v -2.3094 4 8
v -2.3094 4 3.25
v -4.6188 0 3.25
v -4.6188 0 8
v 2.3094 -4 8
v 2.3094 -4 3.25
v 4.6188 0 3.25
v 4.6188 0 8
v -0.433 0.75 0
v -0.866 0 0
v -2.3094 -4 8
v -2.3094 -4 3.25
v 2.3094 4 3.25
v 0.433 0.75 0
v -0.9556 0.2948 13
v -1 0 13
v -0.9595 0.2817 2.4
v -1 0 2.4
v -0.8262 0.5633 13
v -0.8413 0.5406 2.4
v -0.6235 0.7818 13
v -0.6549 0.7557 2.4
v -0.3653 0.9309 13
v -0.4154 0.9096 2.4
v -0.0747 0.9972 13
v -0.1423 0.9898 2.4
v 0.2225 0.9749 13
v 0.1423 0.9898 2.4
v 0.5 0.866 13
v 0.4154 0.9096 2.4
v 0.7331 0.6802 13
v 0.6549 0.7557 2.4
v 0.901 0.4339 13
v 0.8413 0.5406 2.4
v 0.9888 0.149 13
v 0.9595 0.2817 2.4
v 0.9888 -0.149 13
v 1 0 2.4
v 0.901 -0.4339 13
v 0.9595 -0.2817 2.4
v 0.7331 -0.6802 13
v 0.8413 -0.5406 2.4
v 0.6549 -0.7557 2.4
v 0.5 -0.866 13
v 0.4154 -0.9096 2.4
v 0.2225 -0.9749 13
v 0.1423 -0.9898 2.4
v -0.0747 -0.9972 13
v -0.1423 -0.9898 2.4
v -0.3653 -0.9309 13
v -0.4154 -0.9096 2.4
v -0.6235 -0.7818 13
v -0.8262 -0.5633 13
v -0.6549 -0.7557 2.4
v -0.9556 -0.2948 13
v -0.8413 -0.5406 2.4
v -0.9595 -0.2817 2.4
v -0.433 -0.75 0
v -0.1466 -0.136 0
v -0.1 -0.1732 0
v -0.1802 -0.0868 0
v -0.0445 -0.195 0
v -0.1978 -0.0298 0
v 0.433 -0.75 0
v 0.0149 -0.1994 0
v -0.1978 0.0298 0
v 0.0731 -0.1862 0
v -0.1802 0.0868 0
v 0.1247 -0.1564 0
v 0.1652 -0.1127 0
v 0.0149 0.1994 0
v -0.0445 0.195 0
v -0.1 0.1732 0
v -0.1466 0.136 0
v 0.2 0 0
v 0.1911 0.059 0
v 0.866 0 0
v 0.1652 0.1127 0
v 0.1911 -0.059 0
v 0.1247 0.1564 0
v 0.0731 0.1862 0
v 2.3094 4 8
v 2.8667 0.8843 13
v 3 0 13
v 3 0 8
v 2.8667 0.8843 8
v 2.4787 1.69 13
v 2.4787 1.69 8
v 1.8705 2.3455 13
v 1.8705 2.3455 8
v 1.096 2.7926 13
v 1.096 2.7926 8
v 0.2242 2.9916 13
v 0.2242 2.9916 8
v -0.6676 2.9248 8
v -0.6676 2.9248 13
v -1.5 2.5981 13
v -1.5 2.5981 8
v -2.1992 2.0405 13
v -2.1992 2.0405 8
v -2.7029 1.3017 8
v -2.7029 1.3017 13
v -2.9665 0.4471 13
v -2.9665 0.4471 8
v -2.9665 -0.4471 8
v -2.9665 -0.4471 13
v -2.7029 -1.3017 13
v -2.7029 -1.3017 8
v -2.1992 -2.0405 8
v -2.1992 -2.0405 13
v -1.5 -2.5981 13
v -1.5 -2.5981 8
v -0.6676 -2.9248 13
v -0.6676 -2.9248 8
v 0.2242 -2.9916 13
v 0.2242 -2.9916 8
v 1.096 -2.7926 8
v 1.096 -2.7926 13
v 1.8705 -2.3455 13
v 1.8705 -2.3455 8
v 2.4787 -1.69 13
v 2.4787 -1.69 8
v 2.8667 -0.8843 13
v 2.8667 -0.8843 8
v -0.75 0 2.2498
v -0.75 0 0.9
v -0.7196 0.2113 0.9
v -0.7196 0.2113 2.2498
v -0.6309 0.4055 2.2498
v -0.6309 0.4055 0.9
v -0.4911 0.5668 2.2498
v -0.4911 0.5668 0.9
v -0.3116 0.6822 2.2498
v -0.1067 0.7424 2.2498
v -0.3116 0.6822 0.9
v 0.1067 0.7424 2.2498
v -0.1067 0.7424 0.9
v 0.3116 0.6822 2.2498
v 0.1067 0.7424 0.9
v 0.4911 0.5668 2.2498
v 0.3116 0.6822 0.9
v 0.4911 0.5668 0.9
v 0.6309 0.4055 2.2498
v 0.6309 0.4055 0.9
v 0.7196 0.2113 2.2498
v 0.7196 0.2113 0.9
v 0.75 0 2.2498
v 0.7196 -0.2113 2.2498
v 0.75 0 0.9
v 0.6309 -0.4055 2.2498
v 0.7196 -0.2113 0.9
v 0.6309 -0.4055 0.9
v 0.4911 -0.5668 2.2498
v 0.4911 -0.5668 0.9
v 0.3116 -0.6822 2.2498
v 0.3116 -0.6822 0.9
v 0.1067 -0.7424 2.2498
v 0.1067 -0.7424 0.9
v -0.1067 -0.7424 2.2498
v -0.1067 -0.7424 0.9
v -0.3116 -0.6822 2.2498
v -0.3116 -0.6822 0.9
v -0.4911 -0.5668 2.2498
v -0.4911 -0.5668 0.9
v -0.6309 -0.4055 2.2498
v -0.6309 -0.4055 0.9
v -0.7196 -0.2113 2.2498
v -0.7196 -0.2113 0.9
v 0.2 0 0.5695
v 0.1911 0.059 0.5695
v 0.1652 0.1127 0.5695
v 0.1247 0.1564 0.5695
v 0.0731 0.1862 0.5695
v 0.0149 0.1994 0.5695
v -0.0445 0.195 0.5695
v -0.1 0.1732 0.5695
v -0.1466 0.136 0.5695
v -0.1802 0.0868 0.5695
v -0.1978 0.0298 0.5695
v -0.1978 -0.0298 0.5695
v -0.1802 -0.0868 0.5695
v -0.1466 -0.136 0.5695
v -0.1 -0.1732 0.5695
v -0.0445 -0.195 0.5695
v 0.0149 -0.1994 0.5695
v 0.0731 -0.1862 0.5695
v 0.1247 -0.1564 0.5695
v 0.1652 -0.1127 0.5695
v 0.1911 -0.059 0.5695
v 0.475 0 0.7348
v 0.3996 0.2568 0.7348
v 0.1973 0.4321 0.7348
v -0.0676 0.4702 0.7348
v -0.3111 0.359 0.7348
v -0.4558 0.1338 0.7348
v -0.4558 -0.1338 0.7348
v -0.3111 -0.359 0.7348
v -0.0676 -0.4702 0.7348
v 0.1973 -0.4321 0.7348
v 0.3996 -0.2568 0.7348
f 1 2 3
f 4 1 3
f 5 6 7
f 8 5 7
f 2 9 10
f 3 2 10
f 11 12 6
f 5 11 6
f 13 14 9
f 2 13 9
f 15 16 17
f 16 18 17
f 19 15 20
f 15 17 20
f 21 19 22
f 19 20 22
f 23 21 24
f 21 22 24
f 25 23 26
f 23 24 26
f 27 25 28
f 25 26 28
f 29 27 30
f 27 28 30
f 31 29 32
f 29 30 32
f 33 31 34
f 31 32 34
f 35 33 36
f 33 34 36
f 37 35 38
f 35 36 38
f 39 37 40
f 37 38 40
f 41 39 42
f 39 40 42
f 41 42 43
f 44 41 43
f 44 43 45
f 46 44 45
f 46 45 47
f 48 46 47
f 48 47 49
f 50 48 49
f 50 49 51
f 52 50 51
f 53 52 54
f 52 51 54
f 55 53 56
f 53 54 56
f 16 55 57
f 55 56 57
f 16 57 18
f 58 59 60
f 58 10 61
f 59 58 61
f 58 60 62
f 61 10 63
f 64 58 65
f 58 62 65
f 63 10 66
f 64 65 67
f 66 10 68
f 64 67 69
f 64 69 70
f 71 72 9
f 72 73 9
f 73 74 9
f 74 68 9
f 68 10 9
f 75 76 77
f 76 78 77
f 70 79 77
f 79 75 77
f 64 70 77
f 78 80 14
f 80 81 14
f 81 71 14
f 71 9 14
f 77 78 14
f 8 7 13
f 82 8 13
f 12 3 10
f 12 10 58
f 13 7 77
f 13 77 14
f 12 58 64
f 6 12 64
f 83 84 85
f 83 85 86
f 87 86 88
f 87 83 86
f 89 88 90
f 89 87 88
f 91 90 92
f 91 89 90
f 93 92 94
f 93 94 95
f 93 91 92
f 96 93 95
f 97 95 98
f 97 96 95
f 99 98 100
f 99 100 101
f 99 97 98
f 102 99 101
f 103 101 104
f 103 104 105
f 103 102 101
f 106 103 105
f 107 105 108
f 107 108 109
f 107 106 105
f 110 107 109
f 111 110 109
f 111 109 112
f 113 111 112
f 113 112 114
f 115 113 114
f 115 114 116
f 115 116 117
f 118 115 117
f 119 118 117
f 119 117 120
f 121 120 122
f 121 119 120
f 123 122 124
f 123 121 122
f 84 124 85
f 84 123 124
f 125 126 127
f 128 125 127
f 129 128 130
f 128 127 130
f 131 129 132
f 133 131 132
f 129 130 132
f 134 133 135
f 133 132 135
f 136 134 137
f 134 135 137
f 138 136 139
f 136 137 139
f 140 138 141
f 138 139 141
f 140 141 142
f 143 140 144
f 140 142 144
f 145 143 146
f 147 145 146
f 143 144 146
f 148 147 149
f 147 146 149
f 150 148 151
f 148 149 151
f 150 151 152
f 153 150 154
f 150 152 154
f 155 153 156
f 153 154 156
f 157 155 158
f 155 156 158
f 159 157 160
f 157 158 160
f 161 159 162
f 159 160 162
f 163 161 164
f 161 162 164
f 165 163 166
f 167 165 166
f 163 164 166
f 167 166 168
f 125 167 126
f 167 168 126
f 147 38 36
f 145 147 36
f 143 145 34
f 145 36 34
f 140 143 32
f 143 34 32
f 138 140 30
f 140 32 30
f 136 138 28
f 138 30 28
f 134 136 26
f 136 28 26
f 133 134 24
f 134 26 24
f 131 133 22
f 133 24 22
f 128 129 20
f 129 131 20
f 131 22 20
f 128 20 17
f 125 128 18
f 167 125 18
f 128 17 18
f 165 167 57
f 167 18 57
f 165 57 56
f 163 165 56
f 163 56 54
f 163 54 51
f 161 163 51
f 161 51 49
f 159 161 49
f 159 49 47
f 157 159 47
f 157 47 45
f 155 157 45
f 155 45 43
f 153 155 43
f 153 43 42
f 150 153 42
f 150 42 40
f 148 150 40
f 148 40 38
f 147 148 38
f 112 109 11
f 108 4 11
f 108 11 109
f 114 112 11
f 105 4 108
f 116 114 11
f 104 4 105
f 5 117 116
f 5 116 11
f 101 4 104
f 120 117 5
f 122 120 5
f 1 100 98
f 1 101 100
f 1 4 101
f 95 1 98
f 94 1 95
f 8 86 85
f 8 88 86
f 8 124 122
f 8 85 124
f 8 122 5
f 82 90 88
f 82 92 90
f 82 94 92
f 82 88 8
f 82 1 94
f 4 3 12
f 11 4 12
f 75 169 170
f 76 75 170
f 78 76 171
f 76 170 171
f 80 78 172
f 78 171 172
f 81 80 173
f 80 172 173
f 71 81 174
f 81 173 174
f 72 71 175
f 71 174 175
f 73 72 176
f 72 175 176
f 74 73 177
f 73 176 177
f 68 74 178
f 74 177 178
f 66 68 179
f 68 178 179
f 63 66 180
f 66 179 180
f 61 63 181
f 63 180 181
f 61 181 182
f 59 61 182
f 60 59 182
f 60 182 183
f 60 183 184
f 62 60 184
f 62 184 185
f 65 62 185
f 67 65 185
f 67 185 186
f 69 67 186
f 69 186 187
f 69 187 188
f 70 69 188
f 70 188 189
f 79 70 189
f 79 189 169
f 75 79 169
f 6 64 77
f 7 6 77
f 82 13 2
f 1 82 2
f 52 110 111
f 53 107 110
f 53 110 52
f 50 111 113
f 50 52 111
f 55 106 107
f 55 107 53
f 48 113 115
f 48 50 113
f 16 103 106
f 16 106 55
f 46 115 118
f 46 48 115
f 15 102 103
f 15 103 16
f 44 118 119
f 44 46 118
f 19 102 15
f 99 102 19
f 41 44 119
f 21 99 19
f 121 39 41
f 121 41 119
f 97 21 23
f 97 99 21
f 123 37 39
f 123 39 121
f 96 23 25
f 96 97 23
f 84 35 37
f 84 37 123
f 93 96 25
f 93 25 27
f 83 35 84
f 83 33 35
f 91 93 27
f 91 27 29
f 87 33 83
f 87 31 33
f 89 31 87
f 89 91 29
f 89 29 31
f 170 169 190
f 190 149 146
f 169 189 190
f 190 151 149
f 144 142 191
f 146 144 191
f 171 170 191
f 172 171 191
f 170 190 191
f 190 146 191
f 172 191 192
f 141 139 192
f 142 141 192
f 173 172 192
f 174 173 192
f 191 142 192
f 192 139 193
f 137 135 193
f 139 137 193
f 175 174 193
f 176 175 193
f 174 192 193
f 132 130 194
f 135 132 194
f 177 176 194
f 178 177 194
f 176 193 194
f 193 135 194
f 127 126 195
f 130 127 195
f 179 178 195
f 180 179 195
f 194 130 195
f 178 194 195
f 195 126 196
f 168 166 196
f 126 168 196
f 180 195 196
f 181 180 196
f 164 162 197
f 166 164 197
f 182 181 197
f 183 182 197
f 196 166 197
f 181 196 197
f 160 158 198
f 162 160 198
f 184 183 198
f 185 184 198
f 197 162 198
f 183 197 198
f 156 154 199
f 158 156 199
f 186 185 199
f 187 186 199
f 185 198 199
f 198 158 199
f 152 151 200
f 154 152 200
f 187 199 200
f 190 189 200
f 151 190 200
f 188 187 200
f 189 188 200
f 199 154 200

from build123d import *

# Parameters (mm, degrees)
BOSS_EXTRU_1_DEPTH                  = 13
ESQUISSE2_W                         = 18.874173297
ESQUISSE2_H                         = 12.028484965
ESQUISSE2_R                         = 3
ENL_V_MAT_EXTRU_1_DEPTH             = 5
CHANFREIN1_SIZE                     = 3.25
DIAM_TRE_DU_PER_AGE_1_5_1_5_1_D     = 1.5
DIAM_TRE_DU_PER_AGE_1_5_1_5_1_DEPTH = 12.1
DIAM_TRE_DU_PER_AGE_1_5_1_5_1_TIP   = 0.450645464
DIAM_TRE_DU_PER_AGE_2_0_2_1_D       = 2
DIAM_TRE_DU_PER_AGE_2_0_2_1_DEPTH   = 10.6
DIAM_TRE_DU_PER_AGE_2_0_2_1_TIP     = 0.600860619
DIAM_TRE_DU_PER_AGE_0_4_0_4_1_D     = 0.4
DIAM_TRE_DU_PER_AGE_0_4_0_4_1_DEPTH = 1
DIAM_TRE_DU_PER_AGE_0_4_0_4_1_TIP   = 0.120172124


with BuildPart() as part:
    # Esquisse1 → Boss.-Extru.1 (new body)
    with BuildSketch(Plane.XY):
        Polygon((4.618802154, 0), (2.309401077, 4), (-2.309401077, 4), (-4.618802154, 0), (-2.309401077, -4), (2.309401077, -4), align=None)
    extrude(amount=BOSS_EXTRU_1_DEPTH)

    # Esquisse2 → Enlèv. mat.-Extru.1 (cut)
    with BuildSketch(Plane.XY.offset(13)):
        with Locations((-1.221770637, -0.072445614)):
            Rectangle(ESQUISSE2_W, ESQUISSE2_H)
        Circle(ESQUISSE2_R, mode=Mode.SUBTRACT)
    extrude(amount=-ENL_V_MAT_EXTRU_1_DEPTH, mode=Mode.SUBTRACT)

    # Chanfrein1
    chanfrein1_edges = [part.edges().sort_by_distance(p)[0] for p in [
        (0, -4, 0),
        (-3.464101615, -2, 0),
        (-3.464101615, 2, 0),
        (0, 4, 0),
        (3.464101615, 2, 0),
        (3.464101615, -2, 0),
    ]]
    chamfer(chanfrein1_edges, length=CHANFREIN1_SIZE)

    # Diamètre du perçage Ø1.5 (1.5)1
    with Locations(Plane.XY.offset(13)):
        with Locations((0, 0)):
            Hole(DIAM_TRE_DU_PER_AGE_1_5_1_5_1_D / 2, depth=DIAM_TRE_DU_PER_AGE_1_5_1_5_1_DEPTH)
            with Locations((0, 0, -(DIAM_TRE_DU_PER_AGE_1_5_1_5_1_DEPTH + DIAM_TRE_DU_PER_AGE_1_5_1_5_1_TIP / 2))):  # 118° drill point
                Cone(0, DIAM_TRE_DU_PER_AGE_1_5_1_5_1_D / 2, DIAM_TRE_DU_PER_AGE_1_5_1_5_1_TIP, mode=Mode.SUBTRACT)

    # Diamètre du perçage Ø2.0 (2)1
    with Locations(Plane.XY.offset(13)):
        with Locations((0, 0)):
            Hole(DIAM_TRE_DU_PER_AGE_2_0_2_1_D / 2, depth=DIAM_TRE_DU_PER_AGE_2_0_2_1_DEPTH)
            with Locations((0, 0, -(DIAM_TRE_DU_PER_AGE_2_0_2_1_DEPTH + DIAM_TRE_DU_PER_AGE_2_0_2_1_TIP / 2))):  # 118° drill point
                Cone(0, DIAM_TRE_DU_PER_AGE_2_0_2_1_D / 2, DIAM_TRE_DU_PER_AGE_2_0_2_1_TIP, mode=Mode.SUBTRACT)

    # Diamètre du perçage Ø0.4 (0.4)1
    with Locations(Plane(origin=(0, 0, 0), x_dir=(-1, 0, 0), z_dir=(0, 0, -1))):
        with Locations((0, 0)):
            Hole(DIAM_TRE_DU_PER_AGE_0_4_0_4_1_D / 2, depth=DIAM_TRE_DU_PER_AGE_0_4_0_4_1_DEPTH)
            with Locations((0, 0, -(DIAM_TRE_DU_PER_AGE_0_4_0_4_1_DEPTH + DIAM_TRE_DU_PER_AGE_0_4_0_4_1_TIP / 2))):  # 118° drill point
                Cone(0, DIAM_TRE_DU_PER_AGE_0_4_0_4_1_D / 2, DIAM_TRE_DU_PER_AGE_0_4_0_4_1_TIP, mode=Mode.SUBTRACT)


solid = part.part
